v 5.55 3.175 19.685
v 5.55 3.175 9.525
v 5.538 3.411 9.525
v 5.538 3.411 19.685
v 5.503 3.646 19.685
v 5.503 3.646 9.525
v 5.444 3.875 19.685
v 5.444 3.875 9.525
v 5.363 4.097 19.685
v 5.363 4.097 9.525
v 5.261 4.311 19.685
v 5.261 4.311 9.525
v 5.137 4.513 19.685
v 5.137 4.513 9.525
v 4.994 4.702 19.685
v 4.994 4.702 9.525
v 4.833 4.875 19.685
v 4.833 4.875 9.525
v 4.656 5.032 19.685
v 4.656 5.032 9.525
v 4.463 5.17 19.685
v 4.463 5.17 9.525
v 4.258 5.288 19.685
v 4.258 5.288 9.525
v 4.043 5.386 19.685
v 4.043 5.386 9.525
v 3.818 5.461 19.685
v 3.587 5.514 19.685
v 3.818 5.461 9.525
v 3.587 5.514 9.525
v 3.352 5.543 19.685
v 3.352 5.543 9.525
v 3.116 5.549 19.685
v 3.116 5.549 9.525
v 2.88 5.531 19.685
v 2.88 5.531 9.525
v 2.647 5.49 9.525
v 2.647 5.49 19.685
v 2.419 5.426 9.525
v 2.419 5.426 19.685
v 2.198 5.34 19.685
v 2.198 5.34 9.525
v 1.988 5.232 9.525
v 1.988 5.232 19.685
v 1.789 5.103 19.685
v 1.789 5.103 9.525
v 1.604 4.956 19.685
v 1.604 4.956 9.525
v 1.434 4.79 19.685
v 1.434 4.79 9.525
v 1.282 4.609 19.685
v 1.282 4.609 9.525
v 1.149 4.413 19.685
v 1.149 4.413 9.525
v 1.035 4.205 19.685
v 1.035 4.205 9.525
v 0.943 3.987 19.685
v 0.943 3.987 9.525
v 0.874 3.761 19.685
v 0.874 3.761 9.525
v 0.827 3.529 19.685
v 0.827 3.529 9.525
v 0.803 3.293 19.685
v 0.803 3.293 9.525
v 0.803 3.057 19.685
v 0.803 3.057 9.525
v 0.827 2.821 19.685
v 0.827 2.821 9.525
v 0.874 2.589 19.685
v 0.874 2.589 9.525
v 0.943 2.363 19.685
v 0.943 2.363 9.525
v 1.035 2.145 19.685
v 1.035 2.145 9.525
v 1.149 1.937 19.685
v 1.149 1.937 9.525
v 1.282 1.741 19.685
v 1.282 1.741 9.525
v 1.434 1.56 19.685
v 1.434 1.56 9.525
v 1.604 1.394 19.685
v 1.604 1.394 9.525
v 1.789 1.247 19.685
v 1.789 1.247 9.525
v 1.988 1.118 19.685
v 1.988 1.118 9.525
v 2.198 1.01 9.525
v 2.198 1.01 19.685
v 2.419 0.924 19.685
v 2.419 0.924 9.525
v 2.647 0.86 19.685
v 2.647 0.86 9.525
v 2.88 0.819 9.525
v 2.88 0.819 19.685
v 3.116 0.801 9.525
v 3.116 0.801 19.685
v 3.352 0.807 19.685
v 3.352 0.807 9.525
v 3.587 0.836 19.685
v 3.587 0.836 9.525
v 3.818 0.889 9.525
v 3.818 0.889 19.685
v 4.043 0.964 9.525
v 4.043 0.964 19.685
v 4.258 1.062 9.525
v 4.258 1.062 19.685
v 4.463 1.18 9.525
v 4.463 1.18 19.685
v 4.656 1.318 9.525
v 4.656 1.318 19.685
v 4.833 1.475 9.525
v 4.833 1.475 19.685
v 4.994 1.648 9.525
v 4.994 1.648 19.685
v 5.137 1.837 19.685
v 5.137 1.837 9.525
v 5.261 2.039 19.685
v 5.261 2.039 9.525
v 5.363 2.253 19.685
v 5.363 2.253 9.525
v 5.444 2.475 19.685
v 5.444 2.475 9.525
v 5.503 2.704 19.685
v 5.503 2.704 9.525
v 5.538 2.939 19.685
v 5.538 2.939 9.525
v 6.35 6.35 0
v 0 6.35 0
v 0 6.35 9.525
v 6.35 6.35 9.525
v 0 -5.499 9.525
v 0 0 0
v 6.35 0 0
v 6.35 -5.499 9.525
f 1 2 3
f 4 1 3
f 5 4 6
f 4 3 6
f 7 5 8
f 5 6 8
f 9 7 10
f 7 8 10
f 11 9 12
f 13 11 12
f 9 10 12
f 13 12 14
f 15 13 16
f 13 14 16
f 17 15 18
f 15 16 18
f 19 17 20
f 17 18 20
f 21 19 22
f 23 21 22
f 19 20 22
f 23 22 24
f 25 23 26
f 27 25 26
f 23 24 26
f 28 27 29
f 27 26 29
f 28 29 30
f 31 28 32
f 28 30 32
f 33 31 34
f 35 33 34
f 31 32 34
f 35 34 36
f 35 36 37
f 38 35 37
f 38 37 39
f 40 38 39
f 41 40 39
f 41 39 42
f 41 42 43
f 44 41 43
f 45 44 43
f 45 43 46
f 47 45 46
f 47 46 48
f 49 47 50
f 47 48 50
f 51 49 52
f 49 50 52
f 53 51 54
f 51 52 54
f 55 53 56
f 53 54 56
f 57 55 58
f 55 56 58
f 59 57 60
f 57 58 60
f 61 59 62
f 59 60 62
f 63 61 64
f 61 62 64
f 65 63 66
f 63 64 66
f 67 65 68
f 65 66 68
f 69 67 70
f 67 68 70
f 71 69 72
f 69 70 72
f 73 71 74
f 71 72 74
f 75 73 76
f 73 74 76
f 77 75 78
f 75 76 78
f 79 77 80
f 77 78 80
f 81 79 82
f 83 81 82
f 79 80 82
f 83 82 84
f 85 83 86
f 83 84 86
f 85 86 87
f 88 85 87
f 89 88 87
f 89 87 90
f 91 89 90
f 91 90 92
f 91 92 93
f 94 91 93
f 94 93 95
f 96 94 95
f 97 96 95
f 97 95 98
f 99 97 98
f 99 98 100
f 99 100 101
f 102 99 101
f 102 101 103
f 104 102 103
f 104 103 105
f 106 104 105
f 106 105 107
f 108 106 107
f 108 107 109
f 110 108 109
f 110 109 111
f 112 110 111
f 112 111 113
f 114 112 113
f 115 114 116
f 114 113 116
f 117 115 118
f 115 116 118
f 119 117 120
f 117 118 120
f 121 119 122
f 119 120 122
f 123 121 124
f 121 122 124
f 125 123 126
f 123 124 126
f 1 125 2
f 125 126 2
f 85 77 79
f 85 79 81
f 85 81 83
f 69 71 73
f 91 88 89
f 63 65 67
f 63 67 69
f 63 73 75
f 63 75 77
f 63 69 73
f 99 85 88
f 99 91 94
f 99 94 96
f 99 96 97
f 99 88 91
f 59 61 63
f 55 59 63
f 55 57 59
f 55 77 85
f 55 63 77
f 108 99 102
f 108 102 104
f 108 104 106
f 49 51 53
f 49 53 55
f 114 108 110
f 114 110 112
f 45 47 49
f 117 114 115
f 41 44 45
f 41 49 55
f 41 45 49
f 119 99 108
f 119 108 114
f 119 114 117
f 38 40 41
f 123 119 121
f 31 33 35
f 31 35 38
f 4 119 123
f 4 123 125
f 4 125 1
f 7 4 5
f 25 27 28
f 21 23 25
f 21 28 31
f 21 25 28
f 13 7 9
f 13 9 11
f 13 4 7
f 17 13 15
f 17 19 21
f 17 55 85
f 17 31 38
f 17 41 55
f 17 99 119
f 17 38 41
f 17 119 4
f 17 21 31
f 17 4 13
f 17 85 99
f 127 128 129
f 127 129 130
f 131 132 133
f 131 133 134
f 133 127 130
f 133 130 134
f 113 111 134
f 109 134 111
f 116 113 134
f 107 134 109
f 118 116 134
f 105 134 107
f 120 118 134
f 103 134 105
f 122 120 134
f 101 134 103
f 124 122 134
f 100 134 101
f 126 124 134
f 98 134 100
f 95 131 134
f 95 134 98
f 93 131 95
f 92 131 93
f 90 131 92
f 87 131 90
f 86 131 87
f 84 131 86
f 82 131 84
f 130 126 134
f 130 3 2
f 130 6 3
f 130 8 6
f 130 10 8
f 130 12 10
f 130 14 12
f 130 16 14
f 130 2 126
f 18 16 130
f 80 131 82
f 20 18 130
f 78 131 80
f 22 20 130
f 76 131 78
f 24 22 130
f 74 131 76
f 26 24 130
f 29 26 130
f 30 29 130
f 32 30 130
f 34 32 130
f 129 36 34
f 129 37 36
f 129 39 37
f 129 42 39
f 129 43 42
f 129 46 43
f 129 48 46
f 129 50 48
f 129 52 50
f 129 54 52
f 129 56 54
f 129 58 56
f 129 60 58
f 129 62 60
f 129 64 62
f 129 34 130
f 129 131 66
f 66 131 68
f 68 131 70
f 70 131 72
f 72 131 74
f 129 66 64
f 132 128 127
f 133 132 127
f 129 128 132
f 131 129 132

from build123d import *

# Parameters (mm, degrees)
F0_W     = 6.35
F0_H     = 6.35
F1_DEPTH = 9.525
F2_R     = 2.3749
F3_DEPTH = 10.16
F5_DEPTH = 6.35


with BuildPart() as f1:
    # F0 (on Top) → F1 (new body)
    with BuildSketch(Plane.XY):
        with Locations((3.175, 3.175)):
            Rectangle(F0_W, F0_H)
    extrude(amount=F1_DEPTH)

    # F2 (on face) → F3 (join)
    with BuildSketch(Plane.XY.offset(9.525)):
        with Locations((3.175, 3.175)):
            Circle(F2_R)
    extrude(amount=F3_DEPTH)

    # F4 (on face) → F5 (join, through all)
    with BuildSketch(Plane(origin=(0, 0, 0), x_dir=(0, -1, 0), z_dir=(-1, 0, 0))):
        Polygon((5.499261, 9.525), (0, 9.525), (0, 0), align=None)
    extrude(amount=-F5_DEPTH)


solid = f1.part
